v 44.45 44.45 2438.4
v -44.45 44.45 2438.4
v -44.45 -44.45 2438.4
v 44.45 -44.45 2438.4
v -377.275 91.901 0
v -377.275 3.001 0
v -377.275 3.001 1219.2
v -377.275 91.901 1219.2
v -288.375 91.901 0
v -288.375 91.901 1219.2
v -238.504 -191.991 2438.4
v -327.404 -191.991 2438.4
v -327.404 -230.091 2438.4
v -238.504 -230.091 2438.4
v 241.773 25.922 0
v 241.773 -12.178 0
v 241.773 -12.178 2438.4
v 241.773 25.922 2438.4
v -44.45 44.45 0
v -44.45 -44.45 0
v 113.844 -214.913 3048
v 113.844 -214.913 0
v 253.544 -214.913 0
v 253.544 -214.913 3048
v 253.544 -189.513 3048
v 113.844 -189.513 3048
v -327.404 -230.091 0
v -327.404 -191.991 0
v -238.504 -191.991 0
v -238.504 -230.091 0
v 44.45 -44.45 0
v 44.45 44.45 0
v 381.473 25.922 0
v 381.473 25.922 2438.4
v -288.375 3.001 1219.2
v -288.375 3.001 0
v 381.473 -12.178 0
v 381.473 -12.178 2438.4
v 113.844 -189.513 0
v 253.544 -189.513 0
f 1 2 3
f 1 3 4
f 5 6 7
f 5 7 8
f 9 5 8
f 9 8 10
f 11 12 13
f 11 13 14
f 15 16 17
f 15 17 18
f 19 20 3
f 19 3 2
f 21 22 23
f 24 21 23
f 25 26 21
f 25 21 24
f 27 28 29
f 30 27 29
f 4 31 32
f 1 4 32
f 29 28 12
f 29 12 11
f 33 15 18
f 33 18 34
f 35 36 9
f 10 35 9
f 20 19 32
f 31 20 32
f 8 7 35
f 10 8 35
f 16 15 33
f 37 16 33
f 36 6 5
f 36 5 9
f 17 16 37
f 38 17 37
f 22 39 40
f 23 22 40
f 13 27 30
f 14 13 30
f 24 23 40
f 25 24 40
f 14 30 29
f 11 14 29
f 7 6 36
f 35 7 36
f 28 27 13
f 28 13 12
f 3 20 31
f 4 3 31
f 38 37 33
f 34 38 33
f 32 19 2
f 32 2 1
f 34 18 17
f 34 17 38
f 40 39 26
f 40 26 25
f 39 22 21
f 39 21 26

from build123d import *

# Parameters (mm, degrees)
F0_W     = 88.9
F0_H     = 88.9
F1_DEPTH = 2438.4
F2_W     = 88.9
F2_H     = 88.9
F3_DEPTH = 1219.2
F2_H_2   = 38.1
F4_DEPTH = 2438.4
F2_W_2   = 139.7
F2_H_3   = 25.4
F5_DEPTH = 3048
F6_DEPTH = 2438.4


with BuildPart() as f1:
    # F0 (on Top) → F1 (new body)
    with BuildSketch(Plane.XY):
        Rectangle(F0_W, F0_H)
    extrude(amount=F1_DEPTH)


with BuildPart() as f3:
    # F2 (on Top) → F3 (new body)
    with BuildSketch(Plane.XY):
        with Locations((-332.824809, 47.450527)):
            Rectangle(F2_W, F2_H)
    extrude(amount=F3_DEPTH)


with BuildPart() as f4:
    # F2 (on Top) → F4 (new body)
    with BuildSketch(Plane.XY):
        with Locations((-282.954089, -211.04096)):
            Rectangle(F2_W, F2_H_2)
    extrude(amount=F4_DEPTH)


with BuildPart() as f5:
    # F2 (on Top) → F5 (new body)
    with BuildSketch(Plane.XY):
        with Locations((183.69353, -202.21292)):
            Rectangle(F2_W_2, F2_H_3)
    extrude(amount=F5_DEPTH)


with BuildPart() as f6:
    # F2 (on Top) → F6 (new body)
    with BuildSketch(Plane.XY):
        with Locations((311.62279, 6.872475)):
            Rectangle(F2_W_2, F2_H_2)
    extrude(amount=F6_DEPTH)


solid = Compound([f1.part, f3.part, f4.part, f5.part, f6.part])
